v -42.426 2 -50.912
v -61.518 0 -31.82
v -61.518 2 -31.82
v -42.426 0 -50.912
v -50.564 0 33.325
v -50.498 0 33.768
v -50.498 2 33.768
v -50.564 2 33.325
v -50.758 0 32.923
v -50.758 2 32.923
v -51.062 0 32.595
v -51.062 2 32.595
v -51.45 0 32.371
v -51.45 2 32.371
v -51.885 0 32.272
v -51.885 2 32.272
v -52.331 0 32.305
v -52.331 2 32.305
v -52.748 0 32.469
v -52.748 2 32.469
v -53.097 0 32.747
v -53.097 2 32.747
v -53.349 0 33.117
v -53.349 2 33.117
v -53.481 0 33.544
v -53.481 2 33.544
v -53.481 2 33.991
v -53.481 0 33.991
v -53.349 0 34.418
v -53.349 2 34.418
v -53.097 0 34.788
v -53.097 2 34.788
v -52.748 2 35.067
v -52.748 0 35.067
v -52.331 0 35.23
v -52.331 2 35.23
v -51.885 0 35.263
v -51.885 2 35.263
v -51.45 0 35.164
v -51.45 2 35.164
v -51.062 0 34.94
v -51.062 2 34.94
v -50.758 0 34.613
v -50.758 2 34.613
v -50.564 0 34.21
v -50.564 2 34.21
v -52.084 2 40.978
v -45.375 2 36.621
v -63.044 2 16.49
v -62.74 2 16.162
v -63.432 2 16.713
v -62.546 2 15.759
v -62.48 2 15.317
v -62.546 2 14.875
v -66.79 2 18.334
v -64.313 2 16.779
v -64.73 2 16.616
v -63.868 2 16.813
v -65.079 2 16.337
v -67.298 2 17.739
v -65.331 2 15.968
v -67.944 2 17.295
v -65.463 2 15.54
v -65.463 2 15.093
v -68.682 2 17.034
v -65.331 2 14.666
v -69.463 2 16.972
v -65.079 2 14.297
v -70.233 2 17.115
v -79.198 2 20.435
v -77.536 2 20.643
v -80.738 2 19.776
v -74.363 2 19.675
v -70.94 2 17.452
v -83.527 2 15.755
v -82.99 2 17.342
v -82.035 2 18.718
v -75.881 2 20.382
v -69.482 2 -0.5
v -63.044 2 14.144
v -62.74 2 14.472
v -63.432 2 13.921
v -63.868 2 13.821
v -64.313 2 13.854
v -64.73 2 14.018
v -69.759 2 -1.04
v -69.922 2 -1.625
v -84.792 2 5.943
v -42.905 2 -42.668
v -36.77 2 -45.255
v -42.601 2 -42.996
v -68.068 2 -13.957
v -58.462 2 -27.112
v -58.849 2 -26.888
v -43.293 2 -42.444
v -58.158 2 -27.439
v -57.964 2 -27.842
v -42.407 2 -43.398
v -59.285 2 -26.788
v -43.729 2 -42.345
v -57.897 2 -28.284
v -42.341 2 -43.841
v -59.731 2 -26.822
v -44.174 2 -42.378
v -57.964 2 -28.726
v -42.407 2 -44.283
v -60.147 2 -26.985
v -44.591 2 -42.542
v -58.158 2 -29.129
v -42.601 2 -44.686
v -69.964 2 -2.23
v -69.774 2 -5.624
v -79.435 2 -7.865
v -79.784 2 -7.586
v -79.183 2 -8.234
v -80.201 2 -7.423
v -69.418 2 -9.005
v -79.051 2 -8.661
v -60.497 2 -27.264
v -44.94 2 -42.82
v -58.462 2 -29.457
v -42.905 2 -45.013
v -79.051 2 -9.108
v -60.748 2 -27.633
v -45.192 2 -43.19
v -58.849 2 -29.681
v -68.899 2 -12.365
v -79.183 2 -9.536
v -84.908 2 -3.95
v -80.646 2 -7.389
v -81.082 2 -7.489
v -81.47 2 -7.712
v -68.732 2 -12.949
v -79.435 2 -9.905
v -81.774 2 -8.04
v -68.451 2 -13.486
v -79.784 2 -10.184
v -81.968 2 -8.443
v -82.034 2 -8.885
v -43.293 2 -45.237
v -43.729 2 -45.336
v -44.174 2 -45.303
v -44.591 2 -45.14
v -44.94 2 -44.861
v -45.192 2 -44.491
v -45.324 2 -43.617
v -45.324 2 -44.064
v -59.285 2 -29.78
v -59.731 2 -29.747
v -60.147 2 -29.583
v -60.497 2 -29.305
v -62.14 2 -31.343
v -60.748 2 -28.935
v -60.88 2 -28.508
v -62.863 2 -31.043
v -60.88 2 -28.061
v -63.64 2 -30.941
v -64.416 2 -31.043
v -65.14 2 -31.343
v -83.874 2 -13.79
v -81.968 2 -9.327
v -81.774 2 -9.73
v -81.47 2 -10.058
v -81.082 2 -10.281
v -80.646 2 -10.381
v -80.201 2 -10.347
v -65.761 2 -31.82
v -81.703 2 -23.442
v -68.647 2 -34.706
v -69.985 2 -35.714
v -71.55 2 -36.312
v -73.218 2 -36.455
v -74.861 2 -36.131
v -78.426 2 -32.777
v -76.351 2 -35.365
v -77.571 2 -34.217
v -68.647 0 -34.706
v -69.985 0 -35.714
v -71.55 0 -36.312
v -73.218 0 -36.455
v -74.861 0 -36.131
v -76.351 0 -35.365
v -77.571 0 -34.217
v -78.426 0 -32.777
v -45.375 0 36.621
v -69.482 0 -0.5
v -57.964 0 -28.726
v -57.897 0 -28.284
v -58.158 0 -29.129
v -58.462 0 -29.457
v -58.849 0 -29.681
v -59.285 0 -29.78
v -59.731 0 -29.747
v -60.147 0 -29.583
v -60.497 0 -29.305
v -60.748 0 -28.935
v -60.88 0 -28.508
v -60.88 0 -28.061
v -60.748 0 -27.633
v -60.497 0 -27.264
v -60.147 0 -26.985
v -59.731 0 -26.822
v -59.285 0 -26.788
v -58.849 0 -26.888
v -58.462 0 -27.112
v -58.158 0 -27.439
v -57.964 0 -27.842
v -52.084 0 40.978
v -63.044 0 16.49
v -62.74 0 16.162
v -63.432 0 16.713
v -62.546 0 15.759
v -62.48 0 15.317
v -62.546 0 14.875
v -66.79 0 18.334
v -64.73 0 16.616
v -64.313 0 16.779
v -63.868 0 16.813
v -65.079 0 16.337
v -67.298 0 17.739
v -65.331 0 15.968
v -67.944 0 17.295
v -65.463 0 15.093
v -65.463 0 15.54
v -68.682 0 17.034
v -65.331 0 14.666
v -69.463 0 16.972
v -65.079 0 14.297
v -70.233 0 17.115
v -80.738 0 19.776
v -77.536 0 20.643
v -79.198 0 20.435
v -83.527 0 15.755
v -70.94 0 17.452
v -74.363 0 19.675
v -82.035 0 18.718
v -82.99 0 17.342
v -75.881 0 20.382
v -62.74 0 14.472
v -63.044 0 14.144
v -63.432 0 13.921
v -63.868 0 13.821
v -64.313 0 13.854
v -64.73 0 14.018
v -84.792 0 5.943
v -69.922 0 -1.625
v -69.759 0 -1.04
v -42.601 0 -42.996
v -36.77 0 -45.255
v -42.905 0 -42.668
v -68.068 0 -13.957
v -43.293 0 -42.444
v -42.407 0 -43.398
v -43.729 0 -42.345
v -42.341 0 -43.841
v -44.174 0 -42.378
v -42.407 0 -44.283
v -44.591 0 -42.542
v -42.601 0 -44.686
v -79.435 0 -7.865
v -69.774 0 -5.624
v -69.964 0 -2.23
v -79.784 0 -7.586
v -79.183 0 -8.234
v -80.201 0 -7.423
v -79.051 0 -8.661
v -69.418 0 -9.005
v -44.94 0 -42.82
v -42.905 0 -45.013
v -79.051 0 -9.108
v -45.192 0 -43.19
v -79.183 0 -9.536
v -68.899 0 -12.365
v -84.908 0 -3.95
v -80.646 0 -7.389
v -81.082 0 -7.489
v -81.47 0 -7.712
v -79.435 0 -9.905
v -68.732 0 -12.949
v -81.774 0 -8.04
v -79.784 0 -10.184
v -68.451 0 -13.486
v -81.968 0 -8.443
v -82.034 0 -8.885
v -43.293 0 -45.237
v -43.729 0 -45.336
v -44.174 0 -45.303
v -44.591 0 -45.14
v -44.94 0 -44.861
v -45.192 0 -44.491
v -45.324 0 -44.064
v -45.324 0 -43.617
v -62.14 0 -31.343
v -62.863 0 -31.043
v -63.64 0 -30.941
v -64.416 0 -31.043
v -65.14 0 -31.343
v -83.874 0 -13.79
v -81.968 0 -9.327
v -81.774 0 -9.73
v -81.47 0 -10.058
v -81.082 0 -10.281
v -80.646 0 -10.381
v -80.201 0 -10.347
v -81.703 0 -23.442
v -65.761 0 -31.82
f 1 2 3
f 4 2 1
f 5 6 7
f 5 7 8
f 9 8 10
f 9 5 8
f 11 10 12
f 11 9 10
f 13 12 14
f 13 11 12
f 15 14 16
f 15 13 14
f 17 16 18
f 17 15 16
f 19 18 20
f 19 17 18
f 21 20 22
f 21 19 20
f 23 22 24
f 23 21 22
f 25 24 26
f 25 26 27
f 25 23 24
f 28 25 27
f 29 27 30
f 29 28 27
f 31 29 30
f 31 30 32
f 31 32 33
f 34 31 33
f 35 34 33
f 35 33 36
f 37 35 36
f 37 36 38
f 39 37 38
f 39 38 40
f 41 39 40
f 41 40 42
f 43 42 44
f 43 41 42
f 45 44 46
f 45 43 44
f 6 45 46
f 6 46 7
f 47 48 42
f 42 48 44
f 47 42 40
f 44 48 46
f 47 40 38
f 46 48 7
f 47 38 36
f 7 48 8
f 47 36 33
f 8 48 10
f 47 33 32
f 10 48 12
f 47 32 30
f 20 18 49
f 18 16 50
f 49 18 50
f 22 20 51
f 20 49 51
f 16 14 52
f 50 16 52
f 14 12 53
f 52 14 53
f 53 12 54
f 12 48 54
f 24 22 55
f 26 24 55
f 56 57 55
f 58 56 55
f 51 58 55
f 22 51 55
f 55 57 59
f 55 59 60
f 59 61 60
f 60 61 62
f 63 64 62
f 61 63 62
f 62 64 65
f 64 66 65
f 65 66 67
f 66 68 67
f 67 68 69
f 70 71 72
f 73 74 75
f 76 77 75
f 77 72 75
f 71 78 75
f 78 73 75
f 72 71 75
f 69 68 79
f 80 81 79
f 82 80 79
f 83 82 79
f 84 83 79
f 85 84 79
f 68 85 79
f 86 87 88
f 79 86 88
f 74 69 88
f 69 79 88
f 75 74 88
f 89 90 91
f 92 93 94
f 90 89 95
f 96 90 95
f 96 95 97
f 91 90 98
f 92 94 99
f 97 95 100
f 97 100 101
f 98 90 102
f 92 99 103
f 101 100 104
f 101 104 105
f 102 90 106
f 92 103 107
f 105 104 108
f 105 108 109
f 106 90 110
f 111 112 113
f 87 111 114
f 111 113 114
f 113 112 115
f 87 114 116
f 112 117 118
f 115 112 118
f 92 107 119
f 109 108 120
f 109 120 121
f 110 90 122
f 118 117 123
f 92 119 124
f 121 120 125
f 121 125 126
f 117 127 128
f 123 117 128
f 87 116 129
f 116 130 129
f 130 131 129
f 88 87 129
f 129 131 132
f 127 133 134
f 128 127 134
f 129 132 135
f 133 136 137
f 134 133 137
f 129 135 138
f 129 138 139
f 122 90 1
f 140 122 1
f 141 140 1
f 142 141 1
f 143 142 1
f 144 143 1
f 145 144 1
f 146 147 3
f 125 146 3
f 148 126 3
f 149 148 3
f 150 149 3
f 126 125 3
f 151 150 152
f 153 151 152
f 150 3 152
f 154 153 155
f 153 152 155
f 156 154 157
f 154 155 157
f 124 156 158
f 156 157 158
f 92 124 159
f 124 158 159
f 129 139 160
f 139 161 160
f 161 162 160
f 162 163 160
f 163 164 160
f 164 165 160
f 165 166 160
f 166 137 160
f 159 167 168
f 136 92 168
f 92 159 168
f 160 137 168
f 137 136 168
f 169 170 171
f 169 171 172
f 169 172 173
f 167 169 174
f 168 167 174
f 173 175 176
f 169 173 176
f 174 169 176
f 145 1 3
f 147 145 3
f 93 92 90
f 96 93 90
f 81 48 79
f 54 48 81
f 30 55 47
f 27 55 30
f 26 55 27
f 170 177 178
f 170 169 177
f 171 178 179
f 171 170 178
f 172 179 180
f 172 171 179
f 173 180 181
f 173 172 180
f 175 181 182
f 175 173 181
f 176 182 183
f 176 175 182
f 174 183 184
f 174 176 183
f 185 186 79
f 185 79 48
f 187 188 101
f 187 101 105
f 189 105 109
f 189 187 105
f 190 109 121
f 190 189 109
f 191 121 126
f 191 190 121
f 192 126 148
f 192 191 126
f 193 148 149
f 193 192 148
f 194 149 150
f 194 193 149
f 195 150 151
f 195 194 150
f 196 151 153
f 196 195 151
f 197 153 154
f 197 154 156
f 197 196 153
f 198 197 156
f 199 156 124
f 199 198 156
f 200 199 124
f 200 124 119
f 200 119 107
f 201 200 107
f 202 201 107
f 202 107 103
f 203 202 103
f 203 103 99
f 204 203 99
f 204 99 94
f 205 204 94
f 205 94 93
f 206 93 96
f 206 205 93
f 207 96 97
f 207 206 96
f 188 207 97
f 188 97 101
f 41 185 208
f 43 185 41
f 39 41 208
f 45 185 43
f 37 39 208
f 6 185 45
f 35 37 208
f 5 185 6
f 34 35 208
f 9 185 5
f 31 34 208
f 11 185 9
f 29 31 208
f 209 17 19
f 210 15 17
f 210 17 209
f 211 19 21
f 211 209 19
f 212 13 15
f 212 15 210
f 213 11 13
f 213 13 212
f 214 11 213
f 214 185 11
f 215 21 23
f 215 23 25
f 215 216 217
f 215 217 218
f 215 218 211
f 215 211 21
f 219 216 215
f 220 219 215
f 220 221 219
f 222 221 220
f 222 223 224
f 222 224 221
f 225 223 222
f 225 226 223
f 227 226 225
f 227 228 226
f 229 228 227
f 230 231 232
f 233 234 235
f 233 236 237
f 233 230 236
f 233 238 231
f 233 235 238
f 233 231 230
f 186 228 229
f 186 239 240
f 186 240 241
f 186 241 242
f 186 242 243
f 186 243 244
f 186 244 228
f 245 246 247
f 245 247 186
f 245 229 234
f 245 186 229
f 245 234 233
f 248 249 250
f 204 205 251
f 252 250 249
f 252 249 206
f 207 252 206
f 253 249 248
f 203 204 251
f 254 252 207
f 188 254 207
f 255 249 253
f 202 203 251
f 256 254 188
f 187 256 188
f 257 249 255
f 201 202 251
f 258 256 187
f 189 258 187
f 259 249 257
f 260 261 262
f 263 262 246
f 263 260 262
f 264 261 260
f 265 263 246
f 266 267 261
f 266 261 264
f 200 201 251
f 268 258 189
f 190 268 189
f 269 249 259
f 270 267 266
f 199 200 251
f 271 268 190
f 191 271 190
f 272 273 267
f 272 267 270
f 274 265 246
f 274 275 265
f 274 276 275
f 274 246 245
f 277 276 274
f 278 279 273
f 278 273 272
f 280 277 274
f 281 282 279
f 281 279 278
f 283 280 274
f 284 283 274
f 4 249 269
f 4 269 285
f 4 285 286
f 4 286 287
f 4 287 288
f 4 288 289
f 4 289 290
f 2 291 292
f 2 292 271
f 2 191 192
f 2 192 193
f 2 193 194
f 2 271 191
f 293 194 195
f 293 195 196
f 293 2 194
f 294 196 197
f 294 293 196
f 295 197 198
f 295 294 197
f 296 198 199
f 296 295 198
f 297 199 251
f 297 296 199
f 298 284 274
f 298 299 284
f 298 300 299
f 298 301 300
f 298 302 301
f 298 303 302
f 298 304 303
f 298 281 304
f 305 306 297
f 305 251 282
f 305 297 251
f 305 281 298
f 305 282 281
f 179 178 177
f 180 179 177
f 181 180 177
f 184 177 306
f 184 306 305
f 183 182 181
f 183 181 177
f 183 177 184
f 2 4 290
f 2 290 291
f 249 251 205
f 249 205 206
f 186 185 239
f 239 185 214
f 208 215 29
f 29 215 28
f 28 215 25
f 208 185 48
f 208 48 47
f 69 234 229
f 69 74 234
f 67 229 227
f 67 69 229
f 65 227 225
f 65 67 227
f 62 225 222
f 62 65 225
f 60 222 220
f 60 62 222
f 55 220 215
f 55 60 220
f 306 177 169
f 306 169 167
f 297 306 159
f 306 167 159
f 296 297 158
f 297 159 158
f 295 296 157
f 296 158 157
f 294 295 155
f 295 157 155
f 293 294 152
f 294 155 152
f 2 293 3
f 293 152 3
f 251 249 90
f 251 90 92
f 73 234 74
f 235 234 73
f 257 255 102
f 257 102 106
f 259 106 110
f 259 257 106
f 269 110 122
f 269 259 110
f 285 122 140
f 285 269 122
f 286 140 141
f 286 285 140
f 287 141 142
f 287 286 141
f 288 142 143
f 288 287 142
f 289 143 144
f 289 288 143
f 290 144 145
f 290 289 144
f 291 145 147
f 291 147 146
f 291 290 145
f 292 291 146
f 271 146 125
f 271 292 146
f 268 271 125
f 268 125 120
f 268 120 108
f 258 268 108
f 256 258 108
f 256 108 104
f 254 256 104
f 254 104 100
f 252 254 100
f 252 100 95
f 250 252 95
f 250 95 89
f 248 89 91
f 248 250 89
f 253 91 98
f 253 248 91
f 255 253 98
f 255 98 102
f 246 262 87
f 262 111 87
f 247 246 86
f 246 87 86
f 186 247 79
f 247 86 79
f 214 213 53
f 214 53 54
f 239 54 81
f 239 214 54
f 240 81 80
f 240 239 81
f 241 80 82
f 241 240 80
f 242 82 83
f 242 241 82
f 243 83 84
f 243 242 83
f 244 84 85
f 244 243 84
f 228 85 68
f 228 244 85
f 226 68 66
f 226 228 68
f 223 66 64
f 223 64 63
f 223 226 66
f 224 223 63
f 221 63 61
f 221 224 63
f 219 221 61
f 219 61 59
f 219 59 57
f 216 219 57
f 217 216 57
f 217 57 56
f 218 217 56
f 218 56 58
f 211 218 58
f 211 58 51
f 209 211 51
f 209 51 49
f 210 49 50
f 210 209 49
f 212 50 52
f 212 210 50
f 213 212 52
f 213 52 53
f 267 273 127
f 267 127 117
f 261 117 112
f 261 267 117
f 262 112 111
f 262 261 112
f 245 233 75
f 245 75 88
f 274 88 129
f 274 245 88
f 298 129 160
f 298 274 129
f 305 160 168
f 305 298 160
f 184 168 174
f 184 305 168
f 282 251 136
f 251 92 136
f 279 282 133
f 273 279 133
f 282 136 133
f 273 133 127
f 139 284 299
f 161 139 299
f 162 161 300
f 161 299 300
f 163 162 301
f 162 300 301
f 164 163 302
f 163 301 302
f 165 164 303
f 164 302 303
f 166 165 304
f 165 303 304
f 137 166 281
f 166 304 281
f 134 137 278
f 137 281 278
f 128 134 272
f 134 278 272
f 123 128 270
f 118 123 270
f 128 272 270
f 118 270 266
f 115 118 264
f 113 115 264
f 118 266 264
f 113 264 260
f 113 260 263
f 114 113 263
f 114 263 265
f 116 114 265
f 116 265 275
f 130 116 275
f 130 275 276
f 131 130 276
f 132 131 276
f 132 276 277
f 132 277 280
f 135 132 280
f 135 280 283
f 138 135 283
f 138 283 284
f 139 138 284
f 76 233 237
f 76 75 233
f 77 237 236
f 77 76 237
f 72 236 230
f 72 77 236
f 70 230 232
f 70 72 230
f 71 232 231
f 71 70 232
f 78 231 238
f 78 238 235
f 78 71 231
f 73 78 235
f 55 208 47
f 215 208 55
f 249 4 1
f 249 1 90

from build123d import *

# Parameters (mm, degrees)
SKETCH1_R                = 1.5
BOSS_EXTRUDE1_DEPTH      = 2
FILLET1_R                = 6
FILLET2_R                = 3
F_3_0_3_DIAMETER_HOLE1_D = 3


with BuildPart() as part:
    # Sketch1 → Boss-Extrude1 (new body)
    with BuildSketch(Plane(origin=(0, 0, 0), x_dir=(1, 0, 0), z_dir=(0, 1, 0))):
        with BuildLine():
            Line((-74.629040009, 40.687914512), (-63.639610307, 29.69848481))
            Line((-63.639610307, 29.69848481), (-42.426406871, 50.911688245))
            Line((-42.426406871, 50.911688245), (-36.769552622, 45.254833996))
            Line((-36.769552622, 45.254833996), (-68.72500623, 13.299380388))
            ThreePointArc((-68.72500623, 13.299380388), (-69.616532676, 7.316992429), (-69.988296617, 1.279975229))
            Line((-69.988296617, 1.279975229), (-45.375058731, -36.621087439))
            Line((-45.375058731, -36.621087439), (-52.084423274, -40.978199719))
            Line((-52.084423274, -40.978199719), (-68.423594325, -15.81808268))
            Line((-68.423594325, -15.81808268), (-81.457709532, -24.282536066))
            ThreePointArc((-81.457709532, -24.282536066), (-84.534361106, 8.884919378), (-74.629040009, 40.687914512))
        make_face()
        with Locations((-43.840620434, 43.840620434)):
            Circle(SKETCH1_R, mode=Mode.SUBTRACT)
        with Locations((-59.39696962, 28.284271247)):
            Circle(SKETCH1_R, mode=Mode.SUBTRACT)
        with Locations((-51.997575213, -33.767620171)):
            Circle(SKETCH1_R, mode=Mode.SUBTRACT)
        with Locations((-63.979633983, -15.316867676)):
            Circle(SKETCH1_R, mode=Mode.SUBTRACT)
    extrude(amount=BOSS_EXTRUDE1_DEPTH)

    # Fillet1
    fillet1_edges = [part.edges().sort_by_distance(p)[0] for p in [
        (-74.629040009, 1, -40.687914512),
        (-81.457709532, 1, 24.282536066),
    ]]
    fillet(fillet1_edges, radius=FILLET1_R)

    # Fillet2
    fillet2_edges = [part.edges().sort_by_distance(p)[0] for p in [
        (-63.639610307, 1, -29.69848481),
        (-68.72500623, 1, -13.299380388),
        (-69.988296617, 1, -1.279975229),
        (-68.423594325, 1, 15.81808268),
    ]]
    fillet(fillet2_edges, radius=FILLET2_R)

    # Ø3.0 (3) Diameter Hole1 (through all)
    with Locations(Plane(origin=(0, 2, 0), x_dir=(1, 0, 0), z_dir=(0, 1, 0))):
        with Locations((-80.534361106, 8.884919378)):
            Hole(F_3_0_3_DIAMETER_HOLE1_D / 2)


solid = part.part
